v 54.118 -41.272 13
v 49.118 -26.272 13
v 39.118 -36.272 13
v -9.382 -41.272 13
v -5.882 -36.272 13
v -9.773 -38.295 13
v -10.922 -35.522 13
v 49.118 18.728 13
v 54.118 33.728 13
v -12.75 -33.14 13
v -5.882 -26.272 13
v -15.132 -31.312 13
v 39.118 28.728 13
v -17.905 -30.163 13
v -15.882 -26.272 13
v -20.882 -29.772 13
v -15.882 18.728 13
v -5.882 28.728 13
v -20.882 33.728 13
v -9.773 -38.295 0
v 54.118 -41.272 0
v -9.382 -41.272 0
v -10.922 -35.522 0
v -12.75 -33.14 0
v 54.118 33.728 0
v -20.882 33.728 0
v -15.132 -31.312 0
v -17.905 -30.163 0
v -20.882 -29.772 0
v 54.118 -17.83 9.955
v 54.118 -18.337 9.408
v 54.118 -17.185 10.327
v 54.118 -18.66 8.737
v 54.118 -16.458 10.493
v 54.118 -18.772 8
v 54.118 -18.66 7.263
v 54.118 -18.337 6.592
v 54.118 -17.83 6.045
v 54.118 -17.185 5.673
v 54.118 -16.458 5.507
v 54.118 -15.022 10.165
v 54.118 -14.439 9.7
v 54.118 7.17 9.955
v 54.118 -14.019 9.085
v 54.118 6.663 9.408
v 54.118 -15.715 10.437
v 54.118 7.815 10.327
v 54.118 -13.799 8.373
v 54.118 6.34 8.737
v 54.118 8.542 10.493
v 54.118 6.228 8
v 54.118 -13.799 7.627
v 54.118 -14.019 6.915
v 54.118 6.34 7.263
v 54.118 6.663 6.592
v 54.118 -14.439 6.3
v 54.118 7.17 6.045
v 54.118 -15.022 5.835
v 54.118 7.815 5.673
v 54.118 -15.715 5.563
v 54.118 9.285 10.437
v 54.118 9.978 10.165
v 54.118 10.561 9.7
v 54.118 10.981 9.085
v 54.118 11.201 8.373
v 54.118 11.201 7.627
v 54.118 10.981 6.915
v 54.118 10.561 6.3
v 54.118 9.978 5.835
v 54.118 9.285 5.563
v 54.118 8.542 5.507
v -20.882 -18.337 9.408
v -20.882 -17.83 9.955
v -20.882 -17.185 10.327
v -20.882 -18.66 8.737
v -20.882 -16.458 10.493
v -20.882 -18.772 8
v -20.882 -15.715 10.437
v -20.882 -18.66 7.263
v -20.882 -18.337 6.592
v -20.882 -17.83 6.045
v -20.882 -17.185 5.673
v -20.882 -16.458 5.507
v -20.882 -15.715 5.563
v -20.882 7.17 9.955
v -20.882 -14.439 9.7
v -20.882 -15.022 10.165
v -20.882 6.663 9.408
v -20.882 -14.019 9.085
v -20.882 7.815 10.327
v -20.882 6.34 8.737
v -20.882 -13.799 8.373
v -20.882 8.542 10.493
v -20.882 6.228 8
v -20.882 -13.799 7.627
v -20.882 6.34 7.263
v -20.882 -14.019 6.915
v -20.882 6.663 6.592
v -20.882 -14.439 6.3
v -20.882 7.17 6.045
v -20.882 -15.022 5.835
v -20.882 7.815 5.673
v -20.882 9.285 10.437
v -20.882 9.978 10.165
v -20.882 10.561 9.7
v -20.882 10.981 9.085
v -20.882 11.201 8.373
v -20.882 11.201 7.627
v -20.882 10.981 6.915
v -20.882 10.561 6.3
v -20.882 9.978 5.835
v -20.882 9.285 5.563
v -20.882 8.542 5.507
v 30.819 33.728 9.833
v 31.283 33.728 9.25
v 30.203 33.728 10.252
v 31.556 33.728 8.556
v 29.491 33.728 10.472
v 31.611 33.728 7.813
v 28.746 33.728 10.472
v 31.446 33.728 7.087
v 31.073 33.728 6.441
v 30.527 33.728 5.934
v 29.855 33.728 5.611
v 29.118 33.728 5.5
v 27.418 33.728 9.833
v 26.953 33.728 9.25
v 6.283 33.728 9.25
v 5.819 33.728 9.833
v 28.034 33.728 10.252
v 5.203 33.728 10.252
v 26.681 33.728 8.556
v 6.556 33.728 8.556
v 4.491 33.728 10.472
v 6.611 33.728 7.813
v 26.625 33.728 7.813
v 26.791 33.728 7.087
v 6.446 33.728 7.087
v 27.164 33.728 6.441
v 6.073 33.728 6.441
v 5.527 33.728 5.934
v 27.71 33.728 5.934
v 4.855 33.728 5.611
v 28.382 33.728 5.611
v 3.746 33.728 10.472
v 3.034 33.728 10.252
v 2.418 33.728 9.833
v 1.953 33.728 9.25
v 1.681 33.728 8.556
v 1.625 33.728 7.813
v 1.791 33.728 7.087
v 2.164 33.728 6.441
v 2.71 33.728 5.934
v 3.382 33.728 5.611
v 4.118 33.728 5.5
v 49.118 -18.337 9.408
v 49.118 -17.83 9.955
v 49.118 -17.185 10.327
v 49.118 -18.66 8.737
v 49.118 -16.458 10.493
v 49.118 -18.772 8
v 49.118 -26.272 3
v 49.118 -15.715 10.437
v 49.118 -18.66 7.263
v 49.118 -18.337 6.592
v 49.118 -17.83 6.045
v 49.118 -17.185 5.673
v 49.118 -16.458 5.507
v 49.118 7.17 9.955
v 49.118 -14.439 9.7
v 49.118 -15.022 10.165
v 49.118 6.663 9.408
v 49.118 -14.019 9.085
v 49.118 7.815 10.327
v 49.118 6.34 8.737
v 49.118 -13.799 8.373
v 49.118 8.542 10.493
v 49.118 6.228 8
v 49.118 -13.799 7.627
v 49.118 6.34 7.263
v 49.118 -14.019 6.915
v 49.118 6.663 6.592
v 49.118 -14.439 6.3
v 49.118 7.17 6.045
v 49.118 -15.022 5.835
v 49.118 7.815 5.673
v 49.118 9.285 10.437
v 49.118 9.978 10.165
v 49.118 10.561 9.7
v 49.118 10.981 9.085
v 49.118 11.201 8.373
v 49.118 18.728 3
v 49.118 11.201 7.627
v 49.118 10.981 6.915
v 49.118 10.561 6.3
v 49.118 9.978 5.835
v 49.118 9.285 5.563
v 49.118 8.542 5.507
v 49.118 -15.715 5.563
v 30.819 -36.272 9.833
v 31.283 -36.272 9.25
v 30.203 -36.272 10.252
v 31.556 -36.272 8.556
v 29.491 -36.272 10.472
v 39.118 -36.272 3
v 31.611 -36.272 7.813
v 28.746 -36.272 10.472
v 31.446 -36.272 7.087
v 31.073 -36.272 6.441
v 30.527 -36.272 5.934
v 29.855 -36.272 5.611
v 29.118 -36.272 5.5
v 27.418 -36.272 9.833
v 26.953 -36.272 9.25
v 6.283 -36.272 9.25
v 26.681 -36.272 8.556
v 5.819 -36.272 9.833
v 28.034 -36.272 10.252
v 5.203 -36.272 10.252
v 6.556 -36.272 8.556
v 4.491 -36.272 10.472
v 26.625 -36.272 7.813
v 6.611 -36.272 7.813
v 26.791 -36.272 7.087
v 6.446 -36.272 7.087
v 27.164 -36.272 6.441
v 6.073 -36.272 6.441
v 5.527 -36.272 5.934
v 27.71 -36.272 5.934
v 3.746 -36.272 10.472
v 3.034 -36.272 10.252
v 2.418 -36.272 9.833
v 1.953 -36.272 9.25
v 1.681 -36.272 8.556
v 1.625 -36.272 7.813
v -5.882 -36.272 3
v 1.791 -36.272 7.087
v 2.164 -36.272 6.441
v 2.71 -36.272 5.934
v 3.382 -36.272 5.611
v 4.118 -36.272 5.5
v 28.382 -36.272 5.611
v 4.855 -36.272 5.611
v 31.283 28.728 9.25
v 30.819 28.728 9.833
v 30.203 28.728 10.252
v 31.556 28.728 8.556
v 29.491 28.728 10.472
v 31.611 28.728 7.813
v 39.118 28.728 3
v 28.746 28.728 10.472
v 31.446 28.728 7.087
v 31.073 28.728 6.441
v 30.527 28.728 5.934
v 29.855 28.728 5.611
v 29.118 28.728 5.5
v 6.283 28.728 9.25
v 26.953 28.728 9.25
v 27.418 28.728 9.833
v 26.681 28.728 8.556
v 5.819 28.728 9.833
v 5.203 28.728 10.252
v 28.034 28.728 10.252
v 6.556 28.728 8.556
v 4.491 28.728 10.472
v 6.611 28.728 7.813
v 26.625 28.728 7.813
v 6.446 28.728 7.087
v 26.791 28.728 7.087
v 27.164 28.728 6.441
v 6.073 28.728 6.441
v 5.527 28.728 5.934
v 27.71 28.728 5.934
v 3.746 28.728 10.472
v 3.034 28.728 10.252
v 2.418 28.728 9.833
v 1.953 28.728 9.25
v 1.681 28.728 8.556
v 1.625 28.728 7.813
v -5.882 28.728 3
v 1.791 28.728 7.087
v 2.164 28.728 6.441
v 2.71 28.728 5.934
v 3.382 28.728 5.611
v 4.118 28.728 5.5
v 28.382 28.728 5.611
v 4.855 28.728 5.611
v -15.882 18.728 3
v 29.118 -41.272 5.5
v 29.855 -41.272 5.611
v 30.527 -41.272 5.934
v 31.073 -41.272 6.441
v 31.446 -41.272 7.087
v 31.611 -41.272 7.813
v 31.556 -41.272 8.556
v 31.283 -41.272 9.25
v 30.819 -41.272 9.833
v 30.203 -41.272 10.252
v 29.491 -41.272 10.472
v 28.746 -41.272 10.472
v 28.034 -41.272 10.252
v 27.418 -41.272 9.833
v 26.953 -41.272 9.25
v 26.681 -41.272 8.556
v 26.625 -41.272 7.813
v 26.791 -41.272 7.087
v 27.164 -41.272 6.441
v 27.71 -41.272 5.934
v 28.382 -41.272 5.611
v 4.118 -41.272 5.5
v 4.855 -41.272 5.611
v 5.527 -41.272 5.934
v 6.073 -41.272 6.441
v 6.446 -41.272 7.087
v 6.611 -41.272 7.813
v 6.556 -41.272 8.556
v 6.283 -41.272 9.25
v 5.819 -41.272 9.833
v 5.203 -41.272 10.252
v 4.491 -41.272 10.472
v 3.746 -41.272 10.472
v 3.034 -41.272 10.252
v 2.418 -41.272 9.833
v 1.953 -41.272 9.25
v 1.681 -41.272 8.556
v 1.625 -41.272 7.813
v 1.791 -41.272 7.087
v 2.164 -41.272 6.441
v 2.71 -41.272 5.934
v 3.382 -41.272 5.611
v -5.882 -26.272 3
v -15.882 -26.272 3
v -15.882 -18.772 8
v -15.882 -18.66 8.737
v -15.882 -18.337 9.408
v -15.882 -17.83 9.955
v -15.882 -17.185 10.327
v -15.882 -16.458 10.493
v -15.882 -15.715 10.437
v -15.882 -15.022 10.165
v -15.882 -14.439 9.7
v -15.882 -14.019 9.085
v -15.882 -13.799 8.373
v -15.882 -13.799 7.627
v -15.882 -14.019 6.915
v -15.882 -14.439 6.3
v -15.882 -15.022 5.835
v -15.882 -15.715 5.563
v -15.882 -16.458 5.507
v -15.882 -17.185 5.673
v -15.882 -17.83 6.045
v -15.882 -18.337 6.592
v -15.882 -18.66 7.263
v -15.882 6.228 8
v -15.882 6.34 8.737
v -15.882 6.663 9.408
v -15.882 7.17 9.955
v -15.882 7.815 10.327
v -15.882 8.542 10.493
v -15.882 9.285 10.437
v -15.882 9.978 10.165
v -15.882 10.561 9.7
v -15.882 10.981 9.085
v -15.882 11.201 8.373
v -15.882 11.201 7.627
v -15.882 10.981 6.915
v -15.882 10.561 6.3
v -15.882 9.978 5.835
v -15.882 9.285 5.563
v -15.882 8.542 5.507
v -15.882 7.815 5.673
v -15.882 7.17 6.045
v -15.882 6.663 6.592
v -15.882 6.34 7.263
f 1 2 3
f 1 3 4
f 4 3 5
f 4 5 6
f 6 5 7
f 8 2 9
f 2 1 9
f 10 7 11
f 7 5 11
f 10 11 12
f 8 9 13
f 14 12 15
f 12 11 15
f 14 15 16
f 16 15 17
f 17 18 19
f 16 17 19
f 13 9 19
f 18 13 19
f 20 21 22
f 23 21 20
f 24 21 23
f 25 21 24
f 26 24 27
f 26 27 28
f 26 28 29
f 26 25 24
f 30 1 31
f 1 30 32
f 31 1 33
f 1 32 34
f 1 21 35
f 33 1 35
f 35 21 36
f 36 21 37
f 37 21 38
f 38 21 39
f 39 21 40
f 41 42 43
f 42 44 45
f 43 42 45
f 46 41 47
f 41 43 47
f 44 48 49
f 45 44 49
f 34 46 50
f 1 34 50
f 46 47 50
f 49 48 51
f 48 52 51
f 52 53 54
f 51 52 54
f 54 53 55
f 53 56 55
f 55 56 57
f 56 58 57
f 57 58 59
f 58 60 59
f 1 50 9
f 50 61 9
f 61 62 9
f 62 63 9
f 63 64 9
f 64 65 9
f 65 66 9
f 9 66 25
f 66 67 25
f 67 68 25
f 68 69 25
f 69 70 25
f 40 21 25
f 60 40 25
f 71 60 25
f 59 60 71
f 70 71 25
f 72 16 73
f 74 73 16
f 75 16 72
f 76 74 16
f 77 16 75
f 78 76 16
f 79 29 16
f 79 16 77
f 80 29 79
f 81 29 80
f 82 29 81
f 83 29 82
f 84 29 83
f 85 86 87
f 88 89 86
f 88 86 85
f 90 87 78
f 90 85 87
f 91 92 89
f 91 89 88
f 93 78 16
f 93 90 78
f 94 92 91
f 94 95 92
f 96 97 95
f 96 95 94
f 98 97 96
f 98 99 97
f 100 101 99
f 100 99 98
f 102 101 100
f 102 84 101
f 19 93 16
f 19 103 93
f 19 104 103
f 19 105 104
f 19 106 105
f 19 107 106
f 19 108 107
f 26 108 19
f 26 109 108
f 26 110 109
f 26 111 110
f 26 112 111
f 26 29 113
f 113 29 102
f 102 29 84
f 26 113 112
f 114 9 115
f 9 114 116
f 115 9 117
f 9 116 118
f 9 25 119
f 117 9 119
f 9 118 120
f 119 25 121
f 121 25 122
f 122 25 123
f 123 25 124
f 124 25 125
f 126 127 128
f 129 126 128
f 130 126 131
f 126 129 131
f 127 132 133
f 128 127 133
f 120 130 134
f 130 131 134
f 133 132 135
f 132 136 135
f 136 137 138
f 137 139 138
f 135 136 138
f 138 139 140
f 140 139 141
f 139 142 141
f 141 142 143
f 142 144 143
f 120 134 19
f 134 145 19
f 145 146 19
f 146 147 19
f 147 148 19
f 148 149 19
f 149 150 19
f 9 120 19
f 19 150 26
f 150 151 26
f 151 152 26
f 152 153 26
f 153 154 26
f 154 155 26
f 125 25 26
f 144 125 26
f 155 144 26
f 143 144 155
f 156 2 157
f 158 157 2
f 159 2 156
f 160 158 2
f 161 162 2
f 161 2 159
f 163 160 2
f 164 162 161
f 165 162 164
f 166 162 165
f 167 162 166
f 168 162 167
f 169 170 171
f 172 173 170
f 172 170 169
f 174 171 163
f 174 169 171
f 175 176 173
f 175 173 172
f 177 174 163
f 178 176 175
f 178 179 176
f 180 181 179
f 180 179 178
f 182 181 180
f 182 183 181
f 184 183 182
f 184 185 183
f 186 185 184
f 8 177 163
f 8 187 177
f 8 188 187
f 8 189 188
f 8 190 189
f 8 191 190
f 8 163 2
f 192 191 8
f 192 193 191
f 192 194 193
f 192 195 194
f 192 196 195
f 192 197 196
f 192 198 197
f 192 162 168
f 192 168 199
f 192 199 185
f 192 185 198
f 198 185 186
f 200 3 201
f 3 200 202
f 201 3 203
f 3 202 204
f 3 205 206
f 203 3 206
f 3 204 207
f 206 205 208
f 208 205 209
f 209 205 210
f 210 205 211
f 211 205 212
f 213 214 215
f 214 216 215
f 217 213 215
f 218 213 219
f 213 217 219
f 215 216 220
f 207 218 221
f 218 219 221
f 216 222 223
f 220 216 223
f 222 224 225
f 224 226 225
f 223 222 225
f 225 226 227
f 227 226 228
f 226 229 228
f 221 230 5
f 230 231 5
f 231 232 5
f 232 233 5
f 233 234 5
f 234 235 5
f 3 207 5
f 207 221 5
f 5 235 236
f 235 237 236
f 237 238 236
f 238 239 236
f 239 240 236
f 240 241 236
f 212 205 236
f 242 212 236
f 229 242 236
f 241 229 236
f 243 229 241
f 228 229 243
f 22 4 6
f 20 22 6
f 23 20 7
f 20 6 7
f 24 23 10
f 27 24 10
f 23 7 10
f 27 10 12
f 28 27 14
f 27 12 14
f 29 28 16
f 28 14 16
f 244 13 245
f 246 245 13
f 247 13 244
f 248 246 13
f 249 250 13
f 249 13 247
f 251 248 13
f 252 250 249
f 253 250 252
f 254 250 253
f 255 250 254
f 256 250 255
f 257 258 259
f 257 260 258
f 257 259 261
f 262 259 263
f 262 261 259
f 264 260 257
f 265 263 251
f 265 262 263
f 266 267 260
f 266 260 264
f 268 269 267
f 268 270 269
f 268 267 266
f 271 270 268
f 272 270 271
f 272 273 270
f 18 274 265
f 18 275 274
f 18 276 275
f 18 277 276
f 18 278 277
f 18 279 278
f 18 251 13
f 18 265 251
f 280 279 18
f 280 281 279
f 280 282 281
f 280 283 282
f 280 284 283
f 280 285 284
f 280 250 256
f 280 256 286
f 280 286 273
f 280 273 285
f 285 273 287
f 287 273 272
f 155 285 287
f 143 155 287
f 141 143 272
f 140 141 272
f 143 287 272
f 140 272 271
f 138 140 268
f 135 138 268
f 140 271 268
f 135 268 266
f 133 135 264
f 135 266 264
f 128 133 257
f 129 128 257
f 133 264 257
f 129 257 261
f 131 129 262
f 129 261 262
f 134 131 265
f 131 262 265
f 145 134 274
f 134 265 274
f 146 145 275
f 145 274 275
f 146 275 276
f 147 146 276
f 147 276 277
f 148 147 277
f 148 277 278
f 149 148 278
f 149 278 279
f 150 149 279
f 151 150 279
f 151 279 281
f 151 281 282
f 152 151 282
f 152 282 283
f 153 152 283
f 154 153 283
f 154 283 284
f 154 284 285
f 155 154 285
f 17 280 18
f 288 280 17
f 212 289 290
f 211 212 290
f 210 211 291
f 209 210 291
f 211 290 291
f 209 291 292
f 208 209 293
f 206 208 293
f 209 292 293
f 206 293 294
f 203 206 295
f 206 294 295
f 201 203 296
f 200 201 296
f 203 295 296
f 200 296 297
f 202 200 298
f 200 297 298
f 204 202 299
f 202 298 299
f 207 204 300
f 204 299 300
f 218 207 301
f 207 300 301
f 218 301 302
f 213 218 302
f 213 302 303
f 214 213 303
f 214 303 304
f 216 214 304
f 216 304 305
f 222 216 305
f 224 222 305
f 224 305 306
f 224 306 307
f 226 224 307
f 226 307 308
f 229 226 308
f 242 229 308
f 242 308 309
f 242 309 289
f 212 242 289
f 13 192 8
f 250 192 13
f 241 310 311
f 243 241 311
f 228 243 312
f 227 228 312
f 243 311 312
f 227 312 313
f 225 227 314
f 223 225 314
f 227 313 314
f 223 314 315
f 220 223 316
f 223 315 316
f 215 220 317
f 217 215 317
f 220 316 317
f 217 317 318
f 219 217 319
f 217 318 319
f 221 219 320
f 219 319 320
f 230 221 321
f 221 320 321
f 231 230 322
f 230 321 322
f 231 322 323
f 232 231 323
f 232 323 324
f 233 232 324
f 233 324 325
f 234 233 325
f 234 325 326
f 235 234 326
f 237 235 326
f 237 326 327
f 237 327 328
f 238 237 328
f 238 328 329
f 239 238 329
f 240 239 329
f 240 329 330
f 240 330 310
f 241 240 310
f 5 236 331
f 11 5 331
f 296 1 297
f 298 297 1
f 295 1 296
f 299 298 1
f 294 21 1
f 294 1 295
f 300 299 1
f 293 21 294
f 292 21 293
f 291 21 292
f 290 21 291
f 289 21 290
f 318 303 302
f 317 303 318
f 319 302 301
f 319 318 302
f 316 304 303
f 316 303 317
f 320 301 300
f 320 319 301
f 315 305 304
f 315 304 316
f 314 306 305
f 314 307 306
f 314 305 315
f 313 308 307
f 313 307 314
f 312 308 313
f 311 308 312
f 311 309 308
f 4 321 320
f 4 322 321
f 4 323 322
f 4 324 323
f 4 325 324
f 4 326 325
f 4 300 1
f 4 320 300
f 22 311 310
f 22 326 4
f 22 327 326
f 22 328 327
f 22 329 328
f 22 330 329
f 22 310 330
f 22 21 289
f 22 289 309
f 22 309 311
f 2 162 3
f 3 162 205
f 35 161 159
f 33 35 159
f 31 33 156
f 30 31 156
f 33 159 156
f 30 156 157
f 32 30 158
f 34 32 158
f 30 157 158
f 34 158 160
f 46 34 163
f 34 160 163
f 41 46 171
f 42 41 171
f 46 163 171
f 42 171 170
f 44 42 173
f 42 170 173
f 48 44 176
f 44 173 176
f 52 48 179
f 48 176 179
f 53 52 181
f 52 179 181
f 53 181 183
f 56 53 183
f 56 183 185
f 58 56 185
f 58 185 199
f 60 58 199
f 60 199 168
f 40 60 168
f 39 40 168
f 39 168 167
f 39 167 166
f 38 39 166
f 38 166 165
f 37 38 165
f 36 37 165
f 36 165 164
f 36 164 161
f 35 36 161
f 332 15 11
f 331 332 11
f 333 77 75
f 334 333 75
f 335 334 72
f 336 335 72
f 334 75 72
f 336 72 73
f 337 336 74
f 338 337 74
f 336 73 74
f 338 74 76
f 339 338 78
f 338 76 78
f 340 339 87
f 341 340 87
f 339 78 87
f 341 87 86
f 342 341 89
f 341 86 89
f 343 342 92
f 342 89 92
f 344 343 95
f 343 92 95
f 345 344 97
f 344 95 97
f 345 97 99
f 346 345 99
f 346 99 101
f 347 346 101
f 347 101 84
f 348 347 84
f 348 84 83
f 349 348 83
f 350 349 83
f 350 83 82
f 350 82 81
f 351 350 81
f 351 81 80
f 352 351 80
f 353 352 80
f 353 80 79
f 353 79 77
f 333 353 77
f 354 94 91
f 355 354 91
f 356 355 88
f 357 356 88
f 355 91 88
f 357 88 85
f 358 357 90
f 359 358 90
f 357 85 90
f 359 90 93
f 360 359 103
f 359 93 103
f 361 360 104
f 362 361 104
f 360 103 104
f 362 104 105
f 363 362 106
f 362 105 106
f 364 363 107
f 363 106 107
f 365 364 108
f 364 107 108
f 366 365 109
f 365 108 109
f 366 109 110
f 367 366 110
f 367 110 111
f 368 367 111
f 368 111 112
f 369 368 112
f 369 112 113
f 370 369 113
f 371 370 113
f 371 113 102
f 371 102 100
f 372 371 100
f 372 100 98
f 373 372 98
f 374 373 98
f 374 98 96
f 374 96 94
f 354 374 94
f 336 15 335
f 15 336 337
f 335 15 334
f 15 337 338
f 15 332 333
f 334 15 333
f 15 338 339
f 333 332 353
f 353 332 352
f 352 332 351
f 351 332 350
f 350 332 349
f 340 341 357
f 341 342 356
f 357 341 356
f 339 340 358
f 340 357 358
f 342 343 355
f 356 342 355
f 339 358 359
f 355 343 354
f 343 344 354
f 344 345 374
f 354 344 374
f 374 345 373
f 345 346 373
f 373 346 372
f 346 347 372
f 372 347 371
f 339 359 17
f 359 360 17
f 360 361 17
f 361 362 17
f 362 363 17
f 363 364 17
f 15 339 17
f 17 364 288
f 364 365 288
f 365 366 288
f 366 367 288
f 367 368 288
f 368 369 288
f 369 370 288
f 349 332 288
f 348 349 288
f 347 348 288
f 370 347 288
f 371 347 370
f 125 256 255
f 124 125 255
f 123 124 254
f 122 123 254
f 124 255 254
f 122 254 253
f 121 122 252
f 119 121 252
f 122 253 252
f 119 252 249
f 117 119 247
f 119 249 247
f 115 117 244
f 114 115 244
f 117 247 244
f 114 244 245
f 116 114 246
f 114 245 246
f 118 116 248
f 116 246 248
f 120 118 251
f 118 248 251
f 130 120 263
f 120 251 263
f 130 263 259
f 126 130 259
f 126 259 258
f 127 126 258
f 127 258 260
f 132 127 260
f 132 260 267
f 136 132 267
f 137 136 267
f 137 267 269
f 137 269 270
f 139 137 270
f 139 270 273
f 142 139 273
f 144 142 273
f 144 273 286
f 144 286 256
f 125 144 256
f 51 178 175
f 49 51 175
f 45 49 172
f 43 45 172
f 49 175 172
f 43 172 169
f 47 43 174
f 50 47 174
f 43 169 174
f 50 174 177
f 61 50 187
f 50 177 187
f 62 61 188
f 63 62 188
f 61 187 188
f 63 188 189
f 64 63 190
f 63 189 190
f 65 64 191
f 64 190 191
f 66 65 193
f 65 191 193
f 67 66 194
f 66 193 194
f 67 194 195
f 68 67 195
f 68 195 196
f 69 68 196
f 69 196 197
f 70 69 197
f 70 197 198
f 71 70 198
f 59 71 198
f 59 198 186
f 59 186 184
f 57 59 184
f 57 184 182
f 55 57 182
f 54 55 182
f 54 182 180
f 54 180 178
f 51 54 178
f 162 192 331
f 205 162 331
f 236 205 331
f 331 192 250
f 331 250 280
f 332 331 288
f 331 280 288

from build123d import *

# Parameters (mm, degrees)
BOSS_EXTRU_1_DEPTH        = 13
COQUE1_T                  = -5
COQUE1_THICKNESS_2_FACE_W = 65
COQUE1_THICKNESS_2_FACE_H = 65
COQUE1_THICKNESS_2_DEPTH  = 2
ENL_V_MAT_EXTRU_1_REACH   = 88.587
ESQUISSE2_R               = 2.5
ENL_V_MAT_EXTRU_2_REACH   = 95.396
ESQUISSE3_R               = 2.5
ESQUISSE4_W               = 15
ESQUISSE4_H               = 15
BOSS_EXTRU_2_DEPTH        = 10
ESQUISSE5_R               = 11.5
ENL_V_MAT_EXTRU_3_DEPTH   = 13


with BuildPart() as part:
    # Esquisse1 → Boss.-Extru.1 (new body)
    with BuildSketch(Plane.XY):
        Polygon((44.118436308, 33.728448276), (54.118436308, 33.728448276), (54.118436308, 23.728448276), (54.118436308, -41.271551724), (-20.881563692, -41.271551724), (-20.881563692, 33.728448276), align=None)
    extrude(amount=BOSS_EXTRU_1_DEPTH)

    # Coque1
    coque1_openings = [part.faces().sort_by_distance(p)[0] for p in [
        (16.618436308, -3.771551724, 13),
    ]]
    offset(amount=COQUE1_T, openings=coque1_openings, kind=Kind.INTERSECTION)

    # Coque1 thickness 2 face (on inner face of the shell) → Coque1 thickness 2 (cut)
    with BuildSketch(Plane(origin=(16.618436308, -3.771551724, 5), x_dir=(-1, 0, 0), z_dir=(0, 0, -1))):
        Rectangle(COQUE1_THICKNESS_2_FACE_W, COQUE1_THICKNESS_2_FACE_H)
    extrude(amount=COQUE1_THICKNESS_2_DEPTH, mode=Mode.SUBTRACT)

    # Enlèv. mat.-Extru.1: up to this face of the body (flat: up to its plane)
    enl_v_mat_extru_1_end = Plane(part.part.faces().sort_by_distance((54.118436308, -3.771551724, 6.5))[0])
    # Esquisse2 → Enlèv. mat.-Extru.1 (cut, up to the picked face)
    with BuildSketch(Plane.ZY.offset(20.881563692), mode=Mode.PRIVATE) as enl_v_mat_extru_1_sk1:
        with Locations(Location((8, -16.271551724, 0), (0, 0, 270))):
            Circle(ESQUISSE2_R)
    enl_v_mat_extru_1_tool1 = split(extrude(enl_v_mat_extru_1_sk1.sketch, amount=-ENL_V_MAT_EXTRU_1_REACH, mode=Mode.PRIVATE), bisect_by=enl_v_mat_extru_1_end, keep=Keep.BOTH, mode=Mode.PRIVATE)
    # Esquisse2 → Enlèv. mat.-Extru.1 (cut, up to the picked face)
    with BuildSketch(Plane.ZY.offset(20.881563692), mode=Mode.PRIVATE) as enl_v_mat_extru_1_sk2:
        with Locations(Location((8, 8.728448276, 0), (0, 0, 270))):
            Circle(ESQUISSE2_R)
    enl_v_mat_extru_1_tool2 = split(extrude(enl_v_mat_extru_1_sk2.sketch, amount=-ENL_V_MAT_EXTRU_1_REACH, mode=Mode.PRIVATE), bisect_by=enl_v_mat_extru_1_end, keep=Keep.BOTH, mode=Mode.PRIVATE)
    add(enl_v_mat_extru_1_tool1.solids().sort_by(Axis((-20.881564, -16.271552, 8), (1, 0, 0)))[0], mode=Mode.SUBTRACT)
    add(enl_v_mat_extru_1_tool2.solids().sort_by(Axis((-20.881564, 8.728448, 8), (1, 0, 0)))[0], mode=Mode.SUBTRACT)

    # Enlèv. mat.-Extru.2: up to this face of the body (flat: up to its plane)
    enl_v_mat_extru_2_end = Plane(part.part.faces().sort_by_distance((16.618436308, 33.728448276, 6.5))[0])
    # Esquisse3 → Enlèv. mat.-Extru.2 (cut, up to the picked face)
    with BuildSketch(Plane.XZ.offset(41.271551724), mode=Mode.PRIVATE) as enl_v_mat_extru_2_sk1:
        with Locations(Location((4.118436308, 8, 0), (0, 0, 270))):
            Circle(ESQUISSE3_R)
    enl_v_mat_extru_2_tool1 = split(extrude(enl_v_mat_extru_2_sk1.sketch, amount=-ENL_V_MAT_EXTRU_2_REACH, mode=Mode.PRIVATE), bisect_by=enl_v_mat_extru_2_end, keep=Keep.BOTH, mode=Mode.PRIVATE)
    # Esquisse3 → Enlèv. mat.-Extru.2 (cut, up to the picked face)
    with BuildSketch(Plane.XZ.offset(41.271551724), mode=Mode.PRIVATE) as enl_v_mat_extru_2_sk2:
        with Locations(Location((29.118436308, 8, 0), (0, 0, 270))):
            Circle(ESQUISSE3_R)
    enl_v_mat_extru_2_tool2 = split(extrude(enl_v_mat_extru_2_sk2.sketch, amount=-ENL_V_MAT_EXTRU_2_REACH, mode=Mode.PRIVATE), bisect_by=enl_v_mat_extru_2_end, keep=Keep.BOTH, mode=Mode.PRIVATE)
    add(enl_v_mat_extru_2_tool1.solids().sort_by(Axis((4.118436, -41.271552, 8), (0, 1, 0)))[0], mode=Mode.SUBTRACT)
    add(enl_v_mat_extru_2_tool2.solids().sort_by(Axis((29.118436, -41.271552, 8), (0, 1, 0)))[0], mode=Mode.SUBTRACT)

    # Esquisse4 → Boss.-Extru.2 (add)
    with BuildSketch(Plane.XY.offset(3)):
        Polygon((-5.881563692, 28.728448276), (-15.881563692, 18.728448276), (-15.881563692, 28.728448276), align=None)
        Polygon((49.118436308, 28.728448276), (49.118436308, 18.728448276), (39.118436308, 28.728448276), align=None)
        Polygon((49.118436308, -36.271551724), (49.118436308, -26.271551724), (39.118436308, -36.271551724), align=None)
        with Locations((-13.381563692, -33.771551724)):
            Rectangle(ESQUISSE4_W, ESQUISSE4_H)
    extrude(amount=BOSS_EXTRU_2_DEPTH)

    # Esquisse5 → Enlèv. mat.-Extru.3 (cut)
    with BuildSketch(Plane.XY.offset(13)):
        with Locations((-20.881563692, -41.271551724)):
            Circle(ESQUISSE5_R)
    extrude(amount=-ENL_V_MAT_EXTRU_3_DEPTH, mode=Mode.SUBTRACT)


solid = part.part
